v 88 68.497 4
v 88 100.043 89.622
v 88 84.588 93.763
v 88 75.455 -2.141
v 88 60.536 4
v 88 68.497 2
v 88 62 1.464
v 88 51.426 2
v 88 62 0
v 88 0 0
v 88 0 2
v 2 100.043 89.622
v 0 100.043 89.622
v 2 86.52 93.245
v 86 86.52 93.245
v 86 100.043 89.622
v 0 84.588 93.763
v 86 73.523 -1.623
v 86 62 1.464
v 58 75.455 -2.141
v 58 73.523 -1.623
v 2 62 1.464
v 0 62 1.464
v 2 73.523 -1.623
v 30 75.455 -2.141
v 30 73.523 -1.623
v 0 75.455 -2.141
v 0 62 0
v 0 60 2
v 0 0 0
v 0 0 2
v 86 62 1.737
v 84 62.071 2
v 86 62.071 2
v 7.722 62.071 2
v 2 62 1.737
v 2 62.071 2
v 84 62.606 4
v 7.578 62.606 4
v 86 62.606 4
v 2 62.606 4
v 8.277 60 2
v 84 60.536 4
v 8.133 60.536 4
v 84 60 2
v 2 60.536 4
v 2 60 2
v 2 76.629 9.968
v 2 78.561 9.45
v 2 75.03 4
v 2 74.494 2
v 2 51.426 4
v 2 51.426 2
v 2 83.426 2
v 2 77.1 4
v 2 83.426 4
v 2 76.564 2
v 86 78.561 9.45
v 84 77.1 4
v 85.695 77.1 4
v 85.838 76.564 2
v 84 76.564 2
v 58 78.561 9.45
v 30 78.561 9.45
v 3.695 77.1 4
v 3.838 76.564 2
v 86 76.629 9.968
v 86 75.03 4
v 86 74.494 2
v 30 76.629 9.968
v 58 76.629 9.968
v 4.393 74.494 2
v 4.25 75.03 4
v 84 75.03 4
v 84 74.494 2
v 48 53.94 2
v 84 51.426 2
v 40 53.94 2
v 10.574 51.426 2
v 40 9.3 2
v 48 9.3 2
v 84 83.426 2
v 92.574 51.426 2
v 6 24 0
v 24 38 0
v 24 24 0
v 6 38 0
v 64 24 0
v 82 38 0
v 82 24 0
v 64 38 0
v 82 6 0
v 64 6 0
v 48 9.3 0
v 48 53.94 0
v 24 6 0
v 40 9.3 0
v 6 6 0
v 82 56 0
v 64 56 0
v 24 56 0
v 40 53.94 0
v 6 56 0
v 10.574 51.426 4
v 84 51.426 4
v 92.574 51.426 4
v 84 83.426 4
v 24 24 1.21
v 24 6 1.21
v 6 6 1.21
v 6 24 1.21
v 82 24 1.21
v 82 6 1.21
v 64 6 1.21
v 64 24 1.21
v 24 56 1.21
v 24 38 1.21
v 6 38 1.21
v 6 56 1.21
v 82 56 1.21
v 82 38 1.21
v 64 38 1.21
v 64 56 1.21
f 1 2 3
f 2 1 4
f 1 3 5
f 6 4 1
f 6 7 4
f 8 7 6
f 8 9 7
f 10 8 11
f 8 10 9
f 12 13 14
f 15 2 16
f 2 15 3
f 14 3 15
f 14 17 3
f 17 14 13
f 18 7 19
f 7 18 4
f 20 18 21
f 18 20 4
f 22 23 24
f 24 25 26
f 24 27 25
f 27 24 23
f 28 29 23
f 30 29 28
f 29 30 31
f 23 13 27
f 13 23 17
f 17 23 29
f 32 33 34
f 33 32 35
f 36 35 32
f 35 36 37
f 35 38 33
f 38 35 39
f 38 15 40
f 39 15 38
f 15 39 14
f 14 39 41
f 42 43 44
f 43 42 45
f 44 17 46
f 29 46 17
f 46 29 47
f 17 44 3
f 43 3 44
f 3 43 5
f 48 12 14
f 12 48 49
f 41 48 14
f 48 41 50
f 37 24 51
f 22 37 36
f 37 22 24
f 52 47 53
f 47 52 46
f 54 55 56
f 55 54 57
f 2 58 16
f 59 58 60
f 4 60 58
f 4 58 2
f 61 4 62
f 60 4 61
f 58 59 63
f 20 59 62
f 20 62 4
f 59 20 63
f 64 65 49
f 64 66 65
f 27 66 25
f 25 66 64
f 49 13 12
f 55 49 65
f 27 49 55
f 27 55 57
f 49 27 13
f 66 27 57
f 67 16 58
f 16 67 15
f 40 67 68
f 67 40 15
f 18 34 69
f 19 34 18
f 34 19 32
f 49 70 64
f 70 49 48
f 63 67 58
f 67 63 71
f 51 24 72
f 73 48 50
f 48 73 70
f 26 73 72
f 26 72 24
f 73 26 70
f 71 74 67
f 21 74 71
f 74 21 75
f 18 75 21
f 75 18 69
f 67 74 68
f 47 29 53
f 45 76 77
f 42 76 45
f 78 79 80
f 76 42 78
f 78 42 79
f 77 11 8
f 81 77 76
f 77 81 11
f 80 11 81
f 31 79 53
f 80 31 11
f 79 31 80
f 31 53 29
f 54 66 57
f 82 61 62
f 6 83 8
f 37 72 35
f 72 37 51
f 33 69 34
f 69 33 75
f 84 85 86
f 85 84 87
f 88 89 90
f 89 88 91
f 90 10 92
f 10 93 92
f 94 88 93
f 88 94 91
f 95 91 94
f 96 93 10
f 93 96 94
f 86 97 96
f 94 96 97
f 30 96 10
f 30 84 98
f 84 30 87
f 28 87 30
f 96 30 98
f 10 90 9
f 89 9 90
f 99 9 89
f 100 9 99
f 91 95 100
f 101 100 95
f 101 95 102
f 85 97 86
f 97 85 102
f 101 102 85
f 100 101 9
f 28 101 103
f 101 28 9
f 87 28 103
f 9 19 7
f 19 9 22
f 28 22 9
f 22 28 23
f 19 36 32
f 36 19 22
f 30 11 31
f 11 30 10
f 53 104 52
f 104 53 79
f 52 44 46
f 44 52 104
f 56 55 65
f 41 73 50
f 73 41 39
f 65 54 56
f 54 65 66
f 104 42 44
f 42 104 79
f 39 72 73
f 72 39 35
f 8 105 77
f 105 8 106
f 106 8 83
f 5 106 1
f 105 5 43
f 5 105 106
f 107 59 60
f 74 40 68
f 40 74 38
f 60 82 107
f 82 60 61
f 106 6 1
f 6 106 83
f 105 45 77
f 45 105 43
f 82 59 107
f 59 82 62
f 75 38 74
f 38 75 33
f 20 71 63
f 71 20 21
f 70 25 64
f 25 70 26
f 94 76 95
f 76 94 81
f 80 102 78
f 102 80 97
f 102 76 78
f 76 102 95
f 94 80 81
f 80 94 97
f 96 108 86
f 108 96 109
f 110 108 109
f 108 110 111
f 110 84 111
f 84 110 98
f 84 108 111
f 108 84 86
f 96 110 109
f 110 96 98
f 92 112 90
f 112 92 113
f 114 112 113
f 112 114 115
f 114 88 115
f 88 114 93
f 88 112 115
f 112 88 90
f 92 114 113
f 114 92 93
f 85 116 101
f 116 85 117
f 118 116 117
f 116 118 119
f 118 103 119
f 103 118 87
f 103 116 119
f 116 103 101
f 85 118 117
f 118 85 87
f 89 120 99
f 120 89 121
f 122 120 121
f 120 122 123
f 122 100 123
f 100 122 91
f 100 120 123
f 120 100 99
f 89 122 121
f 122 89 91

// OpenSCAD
// Phone stand — tilt + charging notch + cable groove + pad recesses
wall     = 2.0;
tilt_deg = 15;
slot_w   = 84;
slot_d   = 14;
lip_h    = 12;
back_h   = 95;
base_d   = 62;
base_w   = slot_w + 2 * wall;
brace_h  = 32;
port_w   = 28;
port_h   = 16;
cable_w  = 8;
cable_d  = 3;
pad_s    = 18;
pad_r    = 1.2;
$fn      = 48;

module inclined_trough() {
  union() {
    cube([base_w, wall, back_h]);
    cube([wall, slot_d + wall, back_h]);
    translate([base_w - wall, 0, 0])
      cube([wall, slot_d + wall, back_h]);
    translate([0, slot_d, 0])
      cube([base_w, wall, lip_h]);
  }
}

module side_brace(x) {
  run = brace_h * tan(tilt_deg);
  translate([x, base_d - wall - run, wall])
    linear_extrude(height = wall)
    polygon([[0, 0], [run, 0], [0, brace_h]]);
}

module charging_notch() {
  translate([base_w / 2 - port_w / 2, slot_d - 1, -0.5])
    cube([port_w, wall + 3, port_h + lip_h + 0.5]);
}

module finger_relief() {
  rw = 22;
  translate([base_w / 2 - rw / 2, slot_d + wall - 0.5, -0.5])
    cube([rw, 2.5, lip_h * 0.55]);
}

module cable_groove() {
  translate([base_w / 2 - cable_w / 2, base_d * 0.15, wall - cable_d + 0.01])
    cube([cable_w, base_d * 0.72, cable_d + 0.1]);
}

module pad_recess(x, y) {
  translate([x, y, -0.01])
    cube([pad_s, pad_s, pad_r + 0.02]);
}

difference() {
  union() {
    cube([base_w, base_d, wall]);
    translate([0, base_d - wall, wall])
      rotate([-tilt_deg, 0, 0])
      inclined_trough();
    side_brace(wall);
    side_brace(base_w - 2 * wall);
  }
  cable_groove();
  translate([0, base_d - wall, wall])
    rotate([-tilt_deg, 0, 0]) {
    charging_notch();
    finger_relief();
  }
  pad_recess(wall + 4, wall + 4);
  pad_recess(base_w - pad_s - wall - 4, wall + 4);
  pad_recess(wall + 4, base_d - pad_s - wall - 4);
  pad_recess(base_w - pad_s - wall - 4, base_d - pad_s - wall - 4);
}
